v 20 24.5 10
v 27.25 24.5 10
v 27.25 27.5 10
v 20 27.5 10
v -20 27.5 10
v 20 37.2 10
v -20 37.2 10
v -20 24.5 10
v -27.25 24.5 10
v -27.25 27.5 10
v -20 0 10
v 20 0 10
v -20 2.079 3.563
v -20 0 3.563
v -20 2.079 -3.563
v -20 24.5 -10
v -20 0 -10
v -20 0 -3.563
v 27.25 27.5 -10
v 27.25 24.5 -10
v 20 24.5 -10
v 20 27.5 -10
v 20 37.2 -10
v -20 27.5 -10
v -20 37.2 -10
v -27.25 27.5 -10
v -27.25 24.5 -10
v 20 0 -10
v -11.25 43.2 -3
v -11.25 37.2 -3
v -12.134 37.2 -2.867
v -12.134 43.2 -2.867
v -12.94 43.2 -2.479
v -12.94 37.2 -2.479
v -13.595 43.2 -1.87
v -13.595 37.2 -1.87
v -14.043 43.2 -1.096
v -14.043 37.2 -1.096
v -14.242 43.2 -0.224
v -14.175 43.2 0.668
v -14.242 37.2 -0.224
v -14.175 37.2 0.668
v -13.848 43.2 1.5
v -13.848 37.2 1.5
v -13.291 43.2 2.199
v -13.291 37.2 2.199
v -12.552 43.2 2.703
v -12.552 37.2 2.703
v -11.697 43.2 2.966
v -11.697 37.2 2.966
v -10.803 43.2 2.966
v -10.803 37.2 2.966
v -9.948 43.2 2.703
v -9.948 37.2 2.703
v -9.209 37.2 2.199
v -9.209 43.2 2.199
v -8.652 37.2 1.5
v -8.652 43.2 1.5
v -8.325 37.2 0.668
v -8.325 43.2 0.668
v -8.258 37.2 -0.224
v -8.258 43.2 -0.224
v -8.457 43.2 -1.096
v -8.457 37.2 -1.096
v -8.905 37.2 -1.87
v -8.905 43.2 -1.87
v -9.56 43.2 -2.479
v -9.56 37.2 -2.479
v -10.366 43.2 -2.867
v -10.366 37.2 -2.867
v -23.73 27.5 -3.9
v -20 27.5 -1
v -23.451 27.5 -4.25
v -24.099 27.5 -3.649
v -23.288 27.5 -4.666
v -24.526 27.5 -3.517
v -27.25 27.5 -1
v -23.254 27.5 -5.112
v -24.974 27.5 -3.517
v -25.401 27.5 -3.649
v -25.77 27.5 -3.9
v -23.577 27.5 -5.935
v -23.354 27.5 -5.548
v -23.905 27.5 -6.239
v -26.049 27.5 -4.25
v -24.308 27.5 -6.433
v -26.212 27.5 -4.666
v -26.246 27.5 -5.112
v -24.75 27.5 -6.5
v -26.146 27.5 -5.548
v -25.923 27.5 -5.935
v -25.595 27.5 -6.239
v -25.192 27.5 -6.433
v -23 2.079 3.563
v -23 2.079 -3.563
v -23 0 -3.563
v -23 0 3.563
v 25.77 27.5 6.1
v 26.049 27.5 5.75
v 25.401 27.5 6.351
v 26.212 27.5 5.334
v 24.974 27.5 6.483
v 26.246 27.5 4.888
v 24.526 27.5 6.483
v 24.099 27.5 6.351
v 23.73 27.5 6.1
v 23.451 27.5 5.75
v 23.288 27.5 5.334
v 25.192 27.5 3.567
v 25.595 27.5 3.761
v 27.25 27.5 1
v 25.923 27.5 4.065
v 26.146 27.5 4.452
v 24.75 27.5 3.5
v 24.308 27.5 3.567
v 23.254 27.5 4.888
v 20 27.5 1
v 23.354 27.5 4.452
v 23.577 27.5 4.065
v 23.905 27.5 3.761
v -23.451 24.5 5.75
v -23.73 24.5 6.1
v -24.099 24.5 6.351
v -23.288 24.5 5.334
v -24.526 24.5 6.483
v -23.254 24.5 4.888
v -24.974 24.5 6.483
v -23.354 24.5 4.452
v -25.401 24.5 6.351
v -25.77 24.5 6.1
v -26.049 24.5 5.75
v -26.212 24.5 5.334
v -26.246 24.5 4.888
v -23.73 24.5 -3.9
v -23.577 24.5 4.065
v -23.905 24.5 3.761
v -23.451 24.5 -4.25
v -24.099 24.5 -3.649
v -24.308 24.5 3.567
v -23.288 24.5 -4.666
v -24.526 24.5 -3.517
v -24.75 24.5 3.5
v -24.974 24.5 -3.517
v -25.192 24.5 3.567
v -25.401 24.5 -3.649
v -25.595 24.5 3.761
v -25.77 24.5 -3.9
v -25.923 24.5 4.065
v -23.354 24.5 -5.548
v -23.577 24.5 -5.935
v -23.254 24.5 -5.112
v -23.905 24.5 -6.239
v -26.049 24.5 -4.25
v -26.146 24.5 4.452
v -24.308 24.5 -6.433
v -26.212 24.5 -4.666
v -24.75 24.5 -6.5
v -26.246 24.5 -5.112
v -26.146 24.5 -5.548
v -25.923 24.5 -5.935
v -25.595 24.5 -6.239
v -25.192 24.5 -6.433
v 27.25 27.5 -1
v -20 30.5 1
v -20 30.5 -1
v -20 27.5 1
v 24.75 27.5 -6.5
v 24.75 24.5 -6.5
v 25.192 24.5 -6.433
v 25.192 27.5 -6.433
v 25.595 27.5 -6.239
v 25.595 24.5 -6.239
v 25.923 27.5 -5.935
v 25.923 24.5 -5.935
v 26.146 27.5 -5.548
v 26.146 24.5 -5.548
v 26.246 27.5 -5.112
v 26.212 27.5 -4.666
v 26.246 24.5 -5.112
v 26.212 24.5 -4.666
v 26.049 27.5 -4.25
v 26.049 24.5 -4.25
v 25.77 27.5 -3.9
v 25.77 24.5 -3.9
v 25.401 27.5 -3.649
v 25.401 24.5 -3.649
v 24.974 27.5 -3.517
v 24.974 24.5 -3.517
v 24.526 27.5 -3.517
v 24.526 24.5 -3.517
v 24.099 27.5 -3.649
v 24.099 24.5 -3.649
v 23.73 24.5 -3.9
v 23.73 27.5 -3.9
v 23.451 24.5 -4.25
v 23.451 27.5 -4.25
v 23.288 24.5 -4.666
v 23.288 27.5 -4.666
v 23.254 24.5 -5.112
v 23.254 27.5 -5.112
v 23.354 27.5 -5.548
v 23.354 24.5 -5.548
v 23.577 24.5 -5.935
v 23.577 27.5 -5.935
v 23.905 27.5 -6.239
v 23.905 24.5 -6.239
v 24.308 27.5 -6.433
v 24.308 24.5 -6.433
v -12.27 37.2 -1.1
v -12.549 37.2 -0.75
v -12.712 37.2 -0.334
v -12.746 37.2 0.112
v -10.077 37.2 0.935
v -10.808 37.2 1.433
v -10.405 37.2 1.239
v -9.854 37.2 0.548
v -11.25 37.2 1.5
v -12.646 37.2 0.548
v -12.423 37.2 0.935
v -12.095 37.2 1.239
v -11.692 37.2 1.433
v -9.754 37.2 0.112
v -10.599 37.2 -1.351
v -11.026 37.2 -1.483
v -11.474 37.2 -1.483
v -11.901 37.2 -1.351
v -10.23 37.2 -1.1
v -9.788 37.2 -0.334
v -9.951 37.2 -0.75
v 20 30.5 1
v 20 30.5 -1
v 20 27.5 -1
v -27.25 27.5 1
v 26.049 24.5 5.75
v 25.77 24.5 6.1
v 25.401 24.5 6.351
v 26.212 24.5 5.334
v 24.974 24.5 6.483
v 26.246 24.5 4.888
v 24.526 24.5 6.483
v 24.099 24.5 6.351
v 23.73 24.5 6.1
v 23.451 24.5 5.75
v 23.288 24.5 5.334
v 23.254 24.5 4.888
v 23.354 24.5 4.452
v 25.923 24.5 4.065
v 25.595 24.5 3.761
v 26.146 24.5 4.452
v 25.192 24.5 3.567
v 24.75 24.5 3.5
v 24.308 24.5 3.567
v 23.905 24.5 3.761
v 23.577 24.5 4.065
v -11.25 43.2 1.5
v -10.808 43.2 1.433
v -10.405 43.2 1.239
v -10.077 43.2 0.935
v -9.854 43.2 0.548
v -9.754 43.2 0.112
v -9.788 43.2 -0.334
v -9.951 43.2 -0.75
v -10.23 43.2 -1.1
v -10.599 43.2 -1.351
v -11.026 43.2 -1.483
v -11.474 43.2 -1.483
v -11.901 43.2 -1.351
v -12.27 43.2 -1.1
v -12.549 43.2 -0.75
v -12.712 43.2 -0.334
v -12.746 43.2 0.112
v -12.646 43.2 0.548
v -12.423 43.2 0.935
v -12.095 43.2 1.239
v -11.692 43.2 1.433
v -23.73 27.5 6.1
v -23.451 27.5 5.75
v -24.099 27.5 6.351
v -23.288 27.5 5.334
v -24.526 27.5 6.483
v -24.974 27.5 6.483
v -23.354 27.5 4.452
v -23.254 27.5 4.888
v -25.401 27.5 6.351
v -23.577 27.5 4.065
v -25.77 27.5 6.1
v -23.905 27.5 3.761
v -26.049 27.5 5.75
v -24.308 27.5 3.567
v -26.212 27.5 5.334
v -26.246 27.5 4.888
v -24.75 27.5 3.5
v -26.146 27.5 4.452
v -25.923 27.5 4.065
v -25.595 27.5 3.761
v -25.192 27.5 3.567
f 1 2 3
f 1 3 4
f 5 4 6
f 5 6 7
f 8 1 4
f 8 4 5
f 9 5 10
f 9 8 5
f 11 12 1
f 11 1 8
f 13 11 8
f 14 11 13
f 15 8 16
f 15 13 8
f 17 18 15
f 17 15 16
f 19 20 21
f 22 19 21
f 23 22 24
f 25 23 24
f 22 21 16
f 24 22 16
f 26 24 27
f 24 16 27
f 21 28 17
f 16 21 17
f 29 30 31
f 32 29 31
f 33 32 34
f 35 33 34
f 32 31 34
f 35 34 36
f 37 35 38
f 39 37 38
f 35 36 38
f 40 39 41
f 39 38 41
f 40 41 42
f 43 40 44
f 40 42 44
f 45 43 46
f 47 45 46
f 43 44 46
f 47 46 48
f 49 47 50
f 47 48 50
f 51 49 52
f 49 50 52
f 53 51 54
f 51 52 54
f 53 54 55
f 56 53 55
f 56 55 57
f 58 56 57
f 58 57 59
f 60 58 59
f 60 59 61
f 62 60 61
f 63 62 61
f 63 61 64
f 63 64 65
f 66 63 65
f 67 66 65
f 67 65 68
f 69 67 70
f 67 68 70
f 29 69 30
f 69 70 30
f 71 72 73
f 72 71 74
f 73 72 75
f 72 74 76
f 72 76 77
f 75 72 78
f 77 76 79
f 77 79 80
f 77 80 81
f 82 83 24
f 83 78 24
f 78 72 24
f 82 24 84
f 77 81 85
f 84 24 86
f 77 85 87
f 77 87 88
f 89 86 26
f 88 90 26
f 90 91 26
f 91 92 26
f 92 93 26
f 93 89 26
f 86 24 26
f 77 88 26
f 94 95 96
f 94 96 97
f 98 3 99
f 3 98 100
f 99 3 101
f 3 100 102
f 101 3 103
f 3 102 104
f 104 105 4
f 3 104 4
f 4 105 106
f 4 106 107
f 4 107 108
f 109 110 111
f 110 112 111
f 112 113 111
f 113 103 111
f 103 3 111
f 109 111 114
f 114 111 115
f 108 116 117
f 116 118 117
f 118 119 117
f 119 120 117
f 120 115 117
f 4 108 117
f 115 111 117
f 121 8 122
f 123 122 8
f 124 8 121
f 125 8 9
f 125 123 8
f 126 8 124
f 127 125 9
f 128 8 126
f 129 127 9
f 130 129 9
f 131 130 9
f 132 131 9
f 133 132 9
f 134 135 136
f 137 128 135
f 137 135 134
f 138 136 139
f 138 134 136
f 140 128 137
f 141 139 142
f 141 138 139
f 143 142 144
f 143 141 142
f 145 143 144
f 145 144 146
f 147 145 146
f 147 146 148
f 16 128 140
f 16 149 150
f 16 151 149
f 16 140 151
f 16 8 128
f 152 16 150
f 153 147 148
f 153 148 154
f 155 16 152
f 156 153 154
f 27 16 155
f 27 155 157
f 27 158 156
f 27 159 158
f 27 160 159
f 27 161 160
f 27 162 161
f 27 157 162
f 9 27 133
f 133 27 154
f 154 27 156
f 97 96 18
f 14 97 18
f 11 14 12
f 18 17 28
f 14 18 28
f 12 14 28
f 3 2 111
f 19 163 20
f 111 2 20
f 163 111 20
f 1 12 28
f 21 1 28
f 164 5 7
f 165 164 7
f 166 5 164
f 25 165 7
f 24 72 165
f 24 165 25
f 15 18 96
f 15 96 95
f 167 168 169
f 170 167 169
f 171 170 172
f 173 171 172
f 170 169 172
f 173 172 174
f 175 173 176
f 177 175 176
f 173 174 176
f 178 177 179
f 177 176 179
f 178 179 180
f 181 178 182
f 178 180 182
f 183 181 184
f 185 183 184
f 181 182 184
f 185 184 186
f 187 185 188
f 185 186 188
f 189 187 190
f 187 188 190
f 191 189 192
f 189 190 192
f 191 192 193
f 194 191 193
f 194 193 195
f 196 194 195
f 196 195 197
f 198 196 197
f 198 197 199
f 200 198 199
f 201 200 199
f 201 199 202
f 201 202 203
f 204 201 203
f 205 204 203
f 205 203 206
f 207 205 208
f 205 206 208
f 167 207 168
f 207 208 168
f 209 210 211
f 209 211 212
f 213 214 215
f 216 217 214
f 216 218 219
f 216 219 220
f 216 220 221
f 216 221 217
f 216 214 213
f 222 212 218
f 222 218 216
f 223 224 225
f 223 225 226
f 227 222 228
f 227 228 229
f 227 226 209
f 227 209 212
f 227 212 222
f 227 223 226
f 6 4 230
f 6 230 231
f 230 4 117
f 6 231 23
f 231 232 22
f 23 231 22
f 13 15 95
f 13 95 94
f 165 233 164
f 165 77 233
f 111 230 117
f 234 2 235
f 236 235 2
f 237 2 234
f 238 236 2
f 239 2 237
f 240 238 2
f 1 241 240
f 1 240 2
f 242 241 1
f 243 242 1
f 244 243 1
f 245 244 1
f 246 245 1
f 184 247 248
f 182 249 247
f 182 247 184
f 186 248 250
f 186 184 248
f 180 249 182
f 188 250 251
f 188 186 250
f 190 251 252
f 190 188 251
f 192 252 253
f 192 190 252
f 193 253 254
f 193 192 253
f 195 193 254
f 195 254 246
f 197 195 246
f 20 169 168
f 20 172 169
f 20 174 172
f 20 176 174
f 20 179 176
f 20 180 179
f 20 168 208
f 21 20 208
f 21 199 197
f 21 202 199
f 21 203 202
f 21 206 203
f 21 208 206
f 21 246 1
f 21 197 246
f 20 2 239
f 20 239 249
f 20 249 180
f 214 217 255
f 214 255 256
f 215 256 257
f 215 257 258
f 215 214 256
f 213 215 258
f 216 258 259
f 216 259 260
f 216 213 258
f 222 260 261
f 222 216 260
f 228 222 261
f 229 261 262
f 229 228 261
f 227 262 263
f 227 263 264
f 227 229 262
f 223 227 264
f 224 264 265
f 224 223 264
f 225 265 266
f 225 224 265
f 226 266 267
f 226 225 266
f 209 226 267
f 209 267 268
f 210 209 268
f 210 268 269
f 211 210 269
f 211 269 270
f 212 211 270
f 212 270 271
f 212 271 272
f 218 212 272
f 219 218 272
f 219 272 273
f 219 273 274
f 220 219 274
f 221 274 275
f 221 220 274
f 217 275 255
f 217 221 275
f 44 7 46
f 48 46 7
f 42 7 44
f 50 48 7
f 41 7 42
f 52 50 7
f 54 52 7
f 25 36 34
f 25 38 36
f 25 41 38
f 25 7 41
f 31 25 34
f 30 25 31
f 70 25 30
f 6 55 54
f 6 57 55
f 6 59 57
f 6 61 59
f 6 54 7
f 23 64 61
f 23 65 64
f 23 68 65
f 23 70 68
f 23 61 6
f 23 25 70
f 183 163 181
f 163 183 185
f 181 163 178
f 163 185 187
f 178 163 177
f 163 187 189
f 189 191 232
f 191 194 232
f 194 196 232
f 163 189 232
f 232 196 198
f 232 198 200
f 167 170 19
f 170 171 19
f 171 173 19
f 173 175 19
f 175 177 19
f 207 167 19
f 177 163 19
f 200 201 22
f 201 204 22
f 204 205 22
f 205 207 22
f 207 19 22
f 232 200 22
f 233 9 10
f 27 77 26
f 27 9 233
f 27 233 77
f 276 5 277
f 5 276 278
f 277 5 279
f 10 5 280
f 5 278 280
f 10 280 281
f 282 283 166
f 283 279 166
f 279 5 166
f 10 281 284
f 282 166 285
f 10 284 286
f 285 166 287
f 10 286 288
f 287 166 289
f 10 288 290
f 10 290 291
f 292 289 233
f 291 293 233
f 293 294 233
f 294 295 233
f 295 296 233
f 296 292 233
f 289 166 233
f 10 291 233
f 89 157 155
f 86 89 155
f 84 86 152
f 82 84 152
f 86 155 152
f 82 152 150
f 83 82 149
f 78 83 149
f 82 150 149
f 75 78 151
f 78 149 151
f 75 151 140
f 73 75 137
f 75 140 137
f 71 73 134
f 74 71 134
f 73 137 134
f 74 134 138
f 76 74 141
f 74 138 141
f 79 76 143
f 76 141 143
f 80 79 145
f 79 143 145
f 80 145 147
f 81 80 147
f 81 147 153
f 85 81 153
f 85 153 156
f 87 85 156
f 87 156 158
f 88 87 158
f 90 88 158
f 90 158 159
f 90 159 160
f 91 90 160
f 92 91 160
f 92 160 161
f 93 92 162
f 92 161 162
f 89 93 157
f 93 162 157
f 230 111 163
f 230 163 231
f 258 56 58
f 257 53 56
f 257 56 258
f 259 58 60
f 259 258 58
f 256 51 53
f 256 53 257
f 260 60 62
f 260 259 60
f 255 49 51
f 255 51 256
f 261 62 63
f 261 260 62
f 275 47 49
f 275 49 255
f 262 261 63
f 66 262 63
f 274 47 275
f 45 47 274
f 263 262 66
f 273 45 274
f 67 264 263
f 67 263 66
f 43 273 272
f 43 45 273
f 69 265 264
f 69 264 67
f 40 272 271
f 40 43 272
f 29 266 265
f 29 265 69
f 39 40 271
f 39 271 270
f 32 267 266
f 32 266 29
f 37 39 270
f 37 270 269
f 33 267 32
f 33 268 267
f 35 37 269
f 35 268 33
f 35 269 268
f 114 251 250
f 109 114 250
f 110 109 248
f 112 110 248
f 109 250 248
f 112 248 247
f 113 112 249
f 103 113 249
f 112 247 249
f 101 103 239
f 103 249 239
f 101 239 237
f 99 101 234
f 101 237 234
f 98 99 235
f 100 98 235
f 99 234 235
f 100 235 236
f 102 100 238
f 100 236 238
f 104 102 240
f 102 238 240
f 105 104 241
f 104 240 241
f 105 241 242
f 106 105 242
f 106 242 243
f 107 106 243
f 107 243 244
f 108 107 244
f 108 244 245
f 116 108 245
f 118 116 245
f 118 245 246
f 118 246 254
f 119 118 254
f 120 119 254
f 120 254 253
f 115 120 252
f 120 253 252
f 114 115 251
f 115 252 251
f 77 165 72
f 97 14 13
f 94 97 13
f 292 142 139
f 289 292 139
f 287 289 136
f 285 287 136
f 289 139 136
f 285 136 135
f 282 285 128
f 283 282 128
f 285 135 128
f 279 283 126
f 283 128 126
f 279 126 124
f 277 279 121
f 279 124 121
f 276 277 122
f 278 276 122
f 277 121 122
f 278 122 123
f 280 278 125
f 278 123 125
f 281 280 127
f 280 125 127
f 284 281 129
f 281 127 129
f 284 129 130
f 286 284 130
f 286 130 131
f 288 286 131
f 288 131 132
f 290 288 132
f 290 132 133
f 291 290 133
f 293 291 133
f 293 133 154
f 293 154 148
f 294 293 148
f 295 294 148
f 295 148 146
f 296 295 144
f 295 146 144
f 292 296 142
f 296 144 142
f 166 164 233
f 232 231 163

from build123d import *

# Parameters (mm, degrees)
SKETCH_1_W      = 40
SKETCH_1_H      = 20
EXTRUDE_1_DEPTH = 37.2
SKETCH_2_W      = 54.5
SKETCH_2_H      = 20
SKETCH_2_R      = 1.5
EXTRUDE_2_DEPTH = 3
SKETCH_3_R      = 3
SKETCH_3_R_2    = 1.5
EXTRUDE_3_DEPTH = 6
SKETCH_4_W      = 7.126568636
SKETCH_4_H      = 2.078756753
EXTRUDE_4_DEPTH = 3
EXTRUDE_5_DEPTH = 1


with BuildPart() as part:
    # 草图1 → 凸台-拉伸1 (new body)
    with BuildSketch(Plane(origin=(0, 0, 0), x_dir=(1, 0, 0), z_dir=(0, 1, 0))):
        Rectangle(SKETCH_1_W, SKETCH_1_H)
    extrude(amount=EXTRUDE_1_DEPTH)

    # 草图2 → 凸台-拉伸2 (add)
    with BuildSketch(Plane(origin=(0, 24.5, 0), x_dir=(-1, 0, 0), z_dir=(0, -1, 0))):
        Rectangle(SKETCH_2_W, SKETCH_2_H)
        with Locations(Location((-24.75, 5, 0), (0, 0, 90))):
            Circle(SKETCH_2_R, mode=Mode.SUBTRACT)
        with Locations(Location((-24.75, -5, 0), (0, 0, 90))):
            Circle(SKETCH_2_R, mode=Mode.SUBTRACT)
        with Locations(Location((24.75, -5, 0), (0, 0, 90))):
            Circle(SKETCH_2_R, mode=Mode.SUBTRACT)
        with Locations(Location((24.75, 5, 0), (0, 0, 90))):
            Circle(SKETCH_2_R, mode=Mode.SUBTRACT)
    extrude(amount=-EXTRUDE_2_DEPTH)

    # 草图3 → 凸台-拉伸3 (add)
    with BuildSketch(Plane(origin=(0, 37.2, 0), x_dir=(1, 0, 0), z_dir=(0, 1, 0))):
        with Locations(Location((-11.25, 0, 0), (0, 0, 90))):
            Circle(SKETCH_3_R)
        with Locations(Location((-11.25, 0, 0), (0, 0, 270))):
            Circle(SKETCH_3_R_2, mode=Mode.SUBTRACT)
    extrude(amount=EXTRUDE_3_DEPTH)

    # 草图4 → 凸台-拉伸4 (add)
    with BuildSketch(Plane.ZY.offset(20)):
        with Locations((0, 1.039378376)):
            Rectangle(SKETCH_4_W, SKETCH_4_H)
    extrude(amount=EXTRUDE_4_DEPTH)

    # 草图5 → 凸台-拉伸5 (add, symmetric)
    with BuildSketch(Plane.XY):
        Polygon((-27.25, 27.5), (-20, 30.5), (-20, 27.5), align=None)
        Polygon((20, 27.5), (27.25, 27.5), (20, 30.5), align=None)
    extrude(amount=EXTRUDE_5_DEPTH, both=True)


solid = part.part
